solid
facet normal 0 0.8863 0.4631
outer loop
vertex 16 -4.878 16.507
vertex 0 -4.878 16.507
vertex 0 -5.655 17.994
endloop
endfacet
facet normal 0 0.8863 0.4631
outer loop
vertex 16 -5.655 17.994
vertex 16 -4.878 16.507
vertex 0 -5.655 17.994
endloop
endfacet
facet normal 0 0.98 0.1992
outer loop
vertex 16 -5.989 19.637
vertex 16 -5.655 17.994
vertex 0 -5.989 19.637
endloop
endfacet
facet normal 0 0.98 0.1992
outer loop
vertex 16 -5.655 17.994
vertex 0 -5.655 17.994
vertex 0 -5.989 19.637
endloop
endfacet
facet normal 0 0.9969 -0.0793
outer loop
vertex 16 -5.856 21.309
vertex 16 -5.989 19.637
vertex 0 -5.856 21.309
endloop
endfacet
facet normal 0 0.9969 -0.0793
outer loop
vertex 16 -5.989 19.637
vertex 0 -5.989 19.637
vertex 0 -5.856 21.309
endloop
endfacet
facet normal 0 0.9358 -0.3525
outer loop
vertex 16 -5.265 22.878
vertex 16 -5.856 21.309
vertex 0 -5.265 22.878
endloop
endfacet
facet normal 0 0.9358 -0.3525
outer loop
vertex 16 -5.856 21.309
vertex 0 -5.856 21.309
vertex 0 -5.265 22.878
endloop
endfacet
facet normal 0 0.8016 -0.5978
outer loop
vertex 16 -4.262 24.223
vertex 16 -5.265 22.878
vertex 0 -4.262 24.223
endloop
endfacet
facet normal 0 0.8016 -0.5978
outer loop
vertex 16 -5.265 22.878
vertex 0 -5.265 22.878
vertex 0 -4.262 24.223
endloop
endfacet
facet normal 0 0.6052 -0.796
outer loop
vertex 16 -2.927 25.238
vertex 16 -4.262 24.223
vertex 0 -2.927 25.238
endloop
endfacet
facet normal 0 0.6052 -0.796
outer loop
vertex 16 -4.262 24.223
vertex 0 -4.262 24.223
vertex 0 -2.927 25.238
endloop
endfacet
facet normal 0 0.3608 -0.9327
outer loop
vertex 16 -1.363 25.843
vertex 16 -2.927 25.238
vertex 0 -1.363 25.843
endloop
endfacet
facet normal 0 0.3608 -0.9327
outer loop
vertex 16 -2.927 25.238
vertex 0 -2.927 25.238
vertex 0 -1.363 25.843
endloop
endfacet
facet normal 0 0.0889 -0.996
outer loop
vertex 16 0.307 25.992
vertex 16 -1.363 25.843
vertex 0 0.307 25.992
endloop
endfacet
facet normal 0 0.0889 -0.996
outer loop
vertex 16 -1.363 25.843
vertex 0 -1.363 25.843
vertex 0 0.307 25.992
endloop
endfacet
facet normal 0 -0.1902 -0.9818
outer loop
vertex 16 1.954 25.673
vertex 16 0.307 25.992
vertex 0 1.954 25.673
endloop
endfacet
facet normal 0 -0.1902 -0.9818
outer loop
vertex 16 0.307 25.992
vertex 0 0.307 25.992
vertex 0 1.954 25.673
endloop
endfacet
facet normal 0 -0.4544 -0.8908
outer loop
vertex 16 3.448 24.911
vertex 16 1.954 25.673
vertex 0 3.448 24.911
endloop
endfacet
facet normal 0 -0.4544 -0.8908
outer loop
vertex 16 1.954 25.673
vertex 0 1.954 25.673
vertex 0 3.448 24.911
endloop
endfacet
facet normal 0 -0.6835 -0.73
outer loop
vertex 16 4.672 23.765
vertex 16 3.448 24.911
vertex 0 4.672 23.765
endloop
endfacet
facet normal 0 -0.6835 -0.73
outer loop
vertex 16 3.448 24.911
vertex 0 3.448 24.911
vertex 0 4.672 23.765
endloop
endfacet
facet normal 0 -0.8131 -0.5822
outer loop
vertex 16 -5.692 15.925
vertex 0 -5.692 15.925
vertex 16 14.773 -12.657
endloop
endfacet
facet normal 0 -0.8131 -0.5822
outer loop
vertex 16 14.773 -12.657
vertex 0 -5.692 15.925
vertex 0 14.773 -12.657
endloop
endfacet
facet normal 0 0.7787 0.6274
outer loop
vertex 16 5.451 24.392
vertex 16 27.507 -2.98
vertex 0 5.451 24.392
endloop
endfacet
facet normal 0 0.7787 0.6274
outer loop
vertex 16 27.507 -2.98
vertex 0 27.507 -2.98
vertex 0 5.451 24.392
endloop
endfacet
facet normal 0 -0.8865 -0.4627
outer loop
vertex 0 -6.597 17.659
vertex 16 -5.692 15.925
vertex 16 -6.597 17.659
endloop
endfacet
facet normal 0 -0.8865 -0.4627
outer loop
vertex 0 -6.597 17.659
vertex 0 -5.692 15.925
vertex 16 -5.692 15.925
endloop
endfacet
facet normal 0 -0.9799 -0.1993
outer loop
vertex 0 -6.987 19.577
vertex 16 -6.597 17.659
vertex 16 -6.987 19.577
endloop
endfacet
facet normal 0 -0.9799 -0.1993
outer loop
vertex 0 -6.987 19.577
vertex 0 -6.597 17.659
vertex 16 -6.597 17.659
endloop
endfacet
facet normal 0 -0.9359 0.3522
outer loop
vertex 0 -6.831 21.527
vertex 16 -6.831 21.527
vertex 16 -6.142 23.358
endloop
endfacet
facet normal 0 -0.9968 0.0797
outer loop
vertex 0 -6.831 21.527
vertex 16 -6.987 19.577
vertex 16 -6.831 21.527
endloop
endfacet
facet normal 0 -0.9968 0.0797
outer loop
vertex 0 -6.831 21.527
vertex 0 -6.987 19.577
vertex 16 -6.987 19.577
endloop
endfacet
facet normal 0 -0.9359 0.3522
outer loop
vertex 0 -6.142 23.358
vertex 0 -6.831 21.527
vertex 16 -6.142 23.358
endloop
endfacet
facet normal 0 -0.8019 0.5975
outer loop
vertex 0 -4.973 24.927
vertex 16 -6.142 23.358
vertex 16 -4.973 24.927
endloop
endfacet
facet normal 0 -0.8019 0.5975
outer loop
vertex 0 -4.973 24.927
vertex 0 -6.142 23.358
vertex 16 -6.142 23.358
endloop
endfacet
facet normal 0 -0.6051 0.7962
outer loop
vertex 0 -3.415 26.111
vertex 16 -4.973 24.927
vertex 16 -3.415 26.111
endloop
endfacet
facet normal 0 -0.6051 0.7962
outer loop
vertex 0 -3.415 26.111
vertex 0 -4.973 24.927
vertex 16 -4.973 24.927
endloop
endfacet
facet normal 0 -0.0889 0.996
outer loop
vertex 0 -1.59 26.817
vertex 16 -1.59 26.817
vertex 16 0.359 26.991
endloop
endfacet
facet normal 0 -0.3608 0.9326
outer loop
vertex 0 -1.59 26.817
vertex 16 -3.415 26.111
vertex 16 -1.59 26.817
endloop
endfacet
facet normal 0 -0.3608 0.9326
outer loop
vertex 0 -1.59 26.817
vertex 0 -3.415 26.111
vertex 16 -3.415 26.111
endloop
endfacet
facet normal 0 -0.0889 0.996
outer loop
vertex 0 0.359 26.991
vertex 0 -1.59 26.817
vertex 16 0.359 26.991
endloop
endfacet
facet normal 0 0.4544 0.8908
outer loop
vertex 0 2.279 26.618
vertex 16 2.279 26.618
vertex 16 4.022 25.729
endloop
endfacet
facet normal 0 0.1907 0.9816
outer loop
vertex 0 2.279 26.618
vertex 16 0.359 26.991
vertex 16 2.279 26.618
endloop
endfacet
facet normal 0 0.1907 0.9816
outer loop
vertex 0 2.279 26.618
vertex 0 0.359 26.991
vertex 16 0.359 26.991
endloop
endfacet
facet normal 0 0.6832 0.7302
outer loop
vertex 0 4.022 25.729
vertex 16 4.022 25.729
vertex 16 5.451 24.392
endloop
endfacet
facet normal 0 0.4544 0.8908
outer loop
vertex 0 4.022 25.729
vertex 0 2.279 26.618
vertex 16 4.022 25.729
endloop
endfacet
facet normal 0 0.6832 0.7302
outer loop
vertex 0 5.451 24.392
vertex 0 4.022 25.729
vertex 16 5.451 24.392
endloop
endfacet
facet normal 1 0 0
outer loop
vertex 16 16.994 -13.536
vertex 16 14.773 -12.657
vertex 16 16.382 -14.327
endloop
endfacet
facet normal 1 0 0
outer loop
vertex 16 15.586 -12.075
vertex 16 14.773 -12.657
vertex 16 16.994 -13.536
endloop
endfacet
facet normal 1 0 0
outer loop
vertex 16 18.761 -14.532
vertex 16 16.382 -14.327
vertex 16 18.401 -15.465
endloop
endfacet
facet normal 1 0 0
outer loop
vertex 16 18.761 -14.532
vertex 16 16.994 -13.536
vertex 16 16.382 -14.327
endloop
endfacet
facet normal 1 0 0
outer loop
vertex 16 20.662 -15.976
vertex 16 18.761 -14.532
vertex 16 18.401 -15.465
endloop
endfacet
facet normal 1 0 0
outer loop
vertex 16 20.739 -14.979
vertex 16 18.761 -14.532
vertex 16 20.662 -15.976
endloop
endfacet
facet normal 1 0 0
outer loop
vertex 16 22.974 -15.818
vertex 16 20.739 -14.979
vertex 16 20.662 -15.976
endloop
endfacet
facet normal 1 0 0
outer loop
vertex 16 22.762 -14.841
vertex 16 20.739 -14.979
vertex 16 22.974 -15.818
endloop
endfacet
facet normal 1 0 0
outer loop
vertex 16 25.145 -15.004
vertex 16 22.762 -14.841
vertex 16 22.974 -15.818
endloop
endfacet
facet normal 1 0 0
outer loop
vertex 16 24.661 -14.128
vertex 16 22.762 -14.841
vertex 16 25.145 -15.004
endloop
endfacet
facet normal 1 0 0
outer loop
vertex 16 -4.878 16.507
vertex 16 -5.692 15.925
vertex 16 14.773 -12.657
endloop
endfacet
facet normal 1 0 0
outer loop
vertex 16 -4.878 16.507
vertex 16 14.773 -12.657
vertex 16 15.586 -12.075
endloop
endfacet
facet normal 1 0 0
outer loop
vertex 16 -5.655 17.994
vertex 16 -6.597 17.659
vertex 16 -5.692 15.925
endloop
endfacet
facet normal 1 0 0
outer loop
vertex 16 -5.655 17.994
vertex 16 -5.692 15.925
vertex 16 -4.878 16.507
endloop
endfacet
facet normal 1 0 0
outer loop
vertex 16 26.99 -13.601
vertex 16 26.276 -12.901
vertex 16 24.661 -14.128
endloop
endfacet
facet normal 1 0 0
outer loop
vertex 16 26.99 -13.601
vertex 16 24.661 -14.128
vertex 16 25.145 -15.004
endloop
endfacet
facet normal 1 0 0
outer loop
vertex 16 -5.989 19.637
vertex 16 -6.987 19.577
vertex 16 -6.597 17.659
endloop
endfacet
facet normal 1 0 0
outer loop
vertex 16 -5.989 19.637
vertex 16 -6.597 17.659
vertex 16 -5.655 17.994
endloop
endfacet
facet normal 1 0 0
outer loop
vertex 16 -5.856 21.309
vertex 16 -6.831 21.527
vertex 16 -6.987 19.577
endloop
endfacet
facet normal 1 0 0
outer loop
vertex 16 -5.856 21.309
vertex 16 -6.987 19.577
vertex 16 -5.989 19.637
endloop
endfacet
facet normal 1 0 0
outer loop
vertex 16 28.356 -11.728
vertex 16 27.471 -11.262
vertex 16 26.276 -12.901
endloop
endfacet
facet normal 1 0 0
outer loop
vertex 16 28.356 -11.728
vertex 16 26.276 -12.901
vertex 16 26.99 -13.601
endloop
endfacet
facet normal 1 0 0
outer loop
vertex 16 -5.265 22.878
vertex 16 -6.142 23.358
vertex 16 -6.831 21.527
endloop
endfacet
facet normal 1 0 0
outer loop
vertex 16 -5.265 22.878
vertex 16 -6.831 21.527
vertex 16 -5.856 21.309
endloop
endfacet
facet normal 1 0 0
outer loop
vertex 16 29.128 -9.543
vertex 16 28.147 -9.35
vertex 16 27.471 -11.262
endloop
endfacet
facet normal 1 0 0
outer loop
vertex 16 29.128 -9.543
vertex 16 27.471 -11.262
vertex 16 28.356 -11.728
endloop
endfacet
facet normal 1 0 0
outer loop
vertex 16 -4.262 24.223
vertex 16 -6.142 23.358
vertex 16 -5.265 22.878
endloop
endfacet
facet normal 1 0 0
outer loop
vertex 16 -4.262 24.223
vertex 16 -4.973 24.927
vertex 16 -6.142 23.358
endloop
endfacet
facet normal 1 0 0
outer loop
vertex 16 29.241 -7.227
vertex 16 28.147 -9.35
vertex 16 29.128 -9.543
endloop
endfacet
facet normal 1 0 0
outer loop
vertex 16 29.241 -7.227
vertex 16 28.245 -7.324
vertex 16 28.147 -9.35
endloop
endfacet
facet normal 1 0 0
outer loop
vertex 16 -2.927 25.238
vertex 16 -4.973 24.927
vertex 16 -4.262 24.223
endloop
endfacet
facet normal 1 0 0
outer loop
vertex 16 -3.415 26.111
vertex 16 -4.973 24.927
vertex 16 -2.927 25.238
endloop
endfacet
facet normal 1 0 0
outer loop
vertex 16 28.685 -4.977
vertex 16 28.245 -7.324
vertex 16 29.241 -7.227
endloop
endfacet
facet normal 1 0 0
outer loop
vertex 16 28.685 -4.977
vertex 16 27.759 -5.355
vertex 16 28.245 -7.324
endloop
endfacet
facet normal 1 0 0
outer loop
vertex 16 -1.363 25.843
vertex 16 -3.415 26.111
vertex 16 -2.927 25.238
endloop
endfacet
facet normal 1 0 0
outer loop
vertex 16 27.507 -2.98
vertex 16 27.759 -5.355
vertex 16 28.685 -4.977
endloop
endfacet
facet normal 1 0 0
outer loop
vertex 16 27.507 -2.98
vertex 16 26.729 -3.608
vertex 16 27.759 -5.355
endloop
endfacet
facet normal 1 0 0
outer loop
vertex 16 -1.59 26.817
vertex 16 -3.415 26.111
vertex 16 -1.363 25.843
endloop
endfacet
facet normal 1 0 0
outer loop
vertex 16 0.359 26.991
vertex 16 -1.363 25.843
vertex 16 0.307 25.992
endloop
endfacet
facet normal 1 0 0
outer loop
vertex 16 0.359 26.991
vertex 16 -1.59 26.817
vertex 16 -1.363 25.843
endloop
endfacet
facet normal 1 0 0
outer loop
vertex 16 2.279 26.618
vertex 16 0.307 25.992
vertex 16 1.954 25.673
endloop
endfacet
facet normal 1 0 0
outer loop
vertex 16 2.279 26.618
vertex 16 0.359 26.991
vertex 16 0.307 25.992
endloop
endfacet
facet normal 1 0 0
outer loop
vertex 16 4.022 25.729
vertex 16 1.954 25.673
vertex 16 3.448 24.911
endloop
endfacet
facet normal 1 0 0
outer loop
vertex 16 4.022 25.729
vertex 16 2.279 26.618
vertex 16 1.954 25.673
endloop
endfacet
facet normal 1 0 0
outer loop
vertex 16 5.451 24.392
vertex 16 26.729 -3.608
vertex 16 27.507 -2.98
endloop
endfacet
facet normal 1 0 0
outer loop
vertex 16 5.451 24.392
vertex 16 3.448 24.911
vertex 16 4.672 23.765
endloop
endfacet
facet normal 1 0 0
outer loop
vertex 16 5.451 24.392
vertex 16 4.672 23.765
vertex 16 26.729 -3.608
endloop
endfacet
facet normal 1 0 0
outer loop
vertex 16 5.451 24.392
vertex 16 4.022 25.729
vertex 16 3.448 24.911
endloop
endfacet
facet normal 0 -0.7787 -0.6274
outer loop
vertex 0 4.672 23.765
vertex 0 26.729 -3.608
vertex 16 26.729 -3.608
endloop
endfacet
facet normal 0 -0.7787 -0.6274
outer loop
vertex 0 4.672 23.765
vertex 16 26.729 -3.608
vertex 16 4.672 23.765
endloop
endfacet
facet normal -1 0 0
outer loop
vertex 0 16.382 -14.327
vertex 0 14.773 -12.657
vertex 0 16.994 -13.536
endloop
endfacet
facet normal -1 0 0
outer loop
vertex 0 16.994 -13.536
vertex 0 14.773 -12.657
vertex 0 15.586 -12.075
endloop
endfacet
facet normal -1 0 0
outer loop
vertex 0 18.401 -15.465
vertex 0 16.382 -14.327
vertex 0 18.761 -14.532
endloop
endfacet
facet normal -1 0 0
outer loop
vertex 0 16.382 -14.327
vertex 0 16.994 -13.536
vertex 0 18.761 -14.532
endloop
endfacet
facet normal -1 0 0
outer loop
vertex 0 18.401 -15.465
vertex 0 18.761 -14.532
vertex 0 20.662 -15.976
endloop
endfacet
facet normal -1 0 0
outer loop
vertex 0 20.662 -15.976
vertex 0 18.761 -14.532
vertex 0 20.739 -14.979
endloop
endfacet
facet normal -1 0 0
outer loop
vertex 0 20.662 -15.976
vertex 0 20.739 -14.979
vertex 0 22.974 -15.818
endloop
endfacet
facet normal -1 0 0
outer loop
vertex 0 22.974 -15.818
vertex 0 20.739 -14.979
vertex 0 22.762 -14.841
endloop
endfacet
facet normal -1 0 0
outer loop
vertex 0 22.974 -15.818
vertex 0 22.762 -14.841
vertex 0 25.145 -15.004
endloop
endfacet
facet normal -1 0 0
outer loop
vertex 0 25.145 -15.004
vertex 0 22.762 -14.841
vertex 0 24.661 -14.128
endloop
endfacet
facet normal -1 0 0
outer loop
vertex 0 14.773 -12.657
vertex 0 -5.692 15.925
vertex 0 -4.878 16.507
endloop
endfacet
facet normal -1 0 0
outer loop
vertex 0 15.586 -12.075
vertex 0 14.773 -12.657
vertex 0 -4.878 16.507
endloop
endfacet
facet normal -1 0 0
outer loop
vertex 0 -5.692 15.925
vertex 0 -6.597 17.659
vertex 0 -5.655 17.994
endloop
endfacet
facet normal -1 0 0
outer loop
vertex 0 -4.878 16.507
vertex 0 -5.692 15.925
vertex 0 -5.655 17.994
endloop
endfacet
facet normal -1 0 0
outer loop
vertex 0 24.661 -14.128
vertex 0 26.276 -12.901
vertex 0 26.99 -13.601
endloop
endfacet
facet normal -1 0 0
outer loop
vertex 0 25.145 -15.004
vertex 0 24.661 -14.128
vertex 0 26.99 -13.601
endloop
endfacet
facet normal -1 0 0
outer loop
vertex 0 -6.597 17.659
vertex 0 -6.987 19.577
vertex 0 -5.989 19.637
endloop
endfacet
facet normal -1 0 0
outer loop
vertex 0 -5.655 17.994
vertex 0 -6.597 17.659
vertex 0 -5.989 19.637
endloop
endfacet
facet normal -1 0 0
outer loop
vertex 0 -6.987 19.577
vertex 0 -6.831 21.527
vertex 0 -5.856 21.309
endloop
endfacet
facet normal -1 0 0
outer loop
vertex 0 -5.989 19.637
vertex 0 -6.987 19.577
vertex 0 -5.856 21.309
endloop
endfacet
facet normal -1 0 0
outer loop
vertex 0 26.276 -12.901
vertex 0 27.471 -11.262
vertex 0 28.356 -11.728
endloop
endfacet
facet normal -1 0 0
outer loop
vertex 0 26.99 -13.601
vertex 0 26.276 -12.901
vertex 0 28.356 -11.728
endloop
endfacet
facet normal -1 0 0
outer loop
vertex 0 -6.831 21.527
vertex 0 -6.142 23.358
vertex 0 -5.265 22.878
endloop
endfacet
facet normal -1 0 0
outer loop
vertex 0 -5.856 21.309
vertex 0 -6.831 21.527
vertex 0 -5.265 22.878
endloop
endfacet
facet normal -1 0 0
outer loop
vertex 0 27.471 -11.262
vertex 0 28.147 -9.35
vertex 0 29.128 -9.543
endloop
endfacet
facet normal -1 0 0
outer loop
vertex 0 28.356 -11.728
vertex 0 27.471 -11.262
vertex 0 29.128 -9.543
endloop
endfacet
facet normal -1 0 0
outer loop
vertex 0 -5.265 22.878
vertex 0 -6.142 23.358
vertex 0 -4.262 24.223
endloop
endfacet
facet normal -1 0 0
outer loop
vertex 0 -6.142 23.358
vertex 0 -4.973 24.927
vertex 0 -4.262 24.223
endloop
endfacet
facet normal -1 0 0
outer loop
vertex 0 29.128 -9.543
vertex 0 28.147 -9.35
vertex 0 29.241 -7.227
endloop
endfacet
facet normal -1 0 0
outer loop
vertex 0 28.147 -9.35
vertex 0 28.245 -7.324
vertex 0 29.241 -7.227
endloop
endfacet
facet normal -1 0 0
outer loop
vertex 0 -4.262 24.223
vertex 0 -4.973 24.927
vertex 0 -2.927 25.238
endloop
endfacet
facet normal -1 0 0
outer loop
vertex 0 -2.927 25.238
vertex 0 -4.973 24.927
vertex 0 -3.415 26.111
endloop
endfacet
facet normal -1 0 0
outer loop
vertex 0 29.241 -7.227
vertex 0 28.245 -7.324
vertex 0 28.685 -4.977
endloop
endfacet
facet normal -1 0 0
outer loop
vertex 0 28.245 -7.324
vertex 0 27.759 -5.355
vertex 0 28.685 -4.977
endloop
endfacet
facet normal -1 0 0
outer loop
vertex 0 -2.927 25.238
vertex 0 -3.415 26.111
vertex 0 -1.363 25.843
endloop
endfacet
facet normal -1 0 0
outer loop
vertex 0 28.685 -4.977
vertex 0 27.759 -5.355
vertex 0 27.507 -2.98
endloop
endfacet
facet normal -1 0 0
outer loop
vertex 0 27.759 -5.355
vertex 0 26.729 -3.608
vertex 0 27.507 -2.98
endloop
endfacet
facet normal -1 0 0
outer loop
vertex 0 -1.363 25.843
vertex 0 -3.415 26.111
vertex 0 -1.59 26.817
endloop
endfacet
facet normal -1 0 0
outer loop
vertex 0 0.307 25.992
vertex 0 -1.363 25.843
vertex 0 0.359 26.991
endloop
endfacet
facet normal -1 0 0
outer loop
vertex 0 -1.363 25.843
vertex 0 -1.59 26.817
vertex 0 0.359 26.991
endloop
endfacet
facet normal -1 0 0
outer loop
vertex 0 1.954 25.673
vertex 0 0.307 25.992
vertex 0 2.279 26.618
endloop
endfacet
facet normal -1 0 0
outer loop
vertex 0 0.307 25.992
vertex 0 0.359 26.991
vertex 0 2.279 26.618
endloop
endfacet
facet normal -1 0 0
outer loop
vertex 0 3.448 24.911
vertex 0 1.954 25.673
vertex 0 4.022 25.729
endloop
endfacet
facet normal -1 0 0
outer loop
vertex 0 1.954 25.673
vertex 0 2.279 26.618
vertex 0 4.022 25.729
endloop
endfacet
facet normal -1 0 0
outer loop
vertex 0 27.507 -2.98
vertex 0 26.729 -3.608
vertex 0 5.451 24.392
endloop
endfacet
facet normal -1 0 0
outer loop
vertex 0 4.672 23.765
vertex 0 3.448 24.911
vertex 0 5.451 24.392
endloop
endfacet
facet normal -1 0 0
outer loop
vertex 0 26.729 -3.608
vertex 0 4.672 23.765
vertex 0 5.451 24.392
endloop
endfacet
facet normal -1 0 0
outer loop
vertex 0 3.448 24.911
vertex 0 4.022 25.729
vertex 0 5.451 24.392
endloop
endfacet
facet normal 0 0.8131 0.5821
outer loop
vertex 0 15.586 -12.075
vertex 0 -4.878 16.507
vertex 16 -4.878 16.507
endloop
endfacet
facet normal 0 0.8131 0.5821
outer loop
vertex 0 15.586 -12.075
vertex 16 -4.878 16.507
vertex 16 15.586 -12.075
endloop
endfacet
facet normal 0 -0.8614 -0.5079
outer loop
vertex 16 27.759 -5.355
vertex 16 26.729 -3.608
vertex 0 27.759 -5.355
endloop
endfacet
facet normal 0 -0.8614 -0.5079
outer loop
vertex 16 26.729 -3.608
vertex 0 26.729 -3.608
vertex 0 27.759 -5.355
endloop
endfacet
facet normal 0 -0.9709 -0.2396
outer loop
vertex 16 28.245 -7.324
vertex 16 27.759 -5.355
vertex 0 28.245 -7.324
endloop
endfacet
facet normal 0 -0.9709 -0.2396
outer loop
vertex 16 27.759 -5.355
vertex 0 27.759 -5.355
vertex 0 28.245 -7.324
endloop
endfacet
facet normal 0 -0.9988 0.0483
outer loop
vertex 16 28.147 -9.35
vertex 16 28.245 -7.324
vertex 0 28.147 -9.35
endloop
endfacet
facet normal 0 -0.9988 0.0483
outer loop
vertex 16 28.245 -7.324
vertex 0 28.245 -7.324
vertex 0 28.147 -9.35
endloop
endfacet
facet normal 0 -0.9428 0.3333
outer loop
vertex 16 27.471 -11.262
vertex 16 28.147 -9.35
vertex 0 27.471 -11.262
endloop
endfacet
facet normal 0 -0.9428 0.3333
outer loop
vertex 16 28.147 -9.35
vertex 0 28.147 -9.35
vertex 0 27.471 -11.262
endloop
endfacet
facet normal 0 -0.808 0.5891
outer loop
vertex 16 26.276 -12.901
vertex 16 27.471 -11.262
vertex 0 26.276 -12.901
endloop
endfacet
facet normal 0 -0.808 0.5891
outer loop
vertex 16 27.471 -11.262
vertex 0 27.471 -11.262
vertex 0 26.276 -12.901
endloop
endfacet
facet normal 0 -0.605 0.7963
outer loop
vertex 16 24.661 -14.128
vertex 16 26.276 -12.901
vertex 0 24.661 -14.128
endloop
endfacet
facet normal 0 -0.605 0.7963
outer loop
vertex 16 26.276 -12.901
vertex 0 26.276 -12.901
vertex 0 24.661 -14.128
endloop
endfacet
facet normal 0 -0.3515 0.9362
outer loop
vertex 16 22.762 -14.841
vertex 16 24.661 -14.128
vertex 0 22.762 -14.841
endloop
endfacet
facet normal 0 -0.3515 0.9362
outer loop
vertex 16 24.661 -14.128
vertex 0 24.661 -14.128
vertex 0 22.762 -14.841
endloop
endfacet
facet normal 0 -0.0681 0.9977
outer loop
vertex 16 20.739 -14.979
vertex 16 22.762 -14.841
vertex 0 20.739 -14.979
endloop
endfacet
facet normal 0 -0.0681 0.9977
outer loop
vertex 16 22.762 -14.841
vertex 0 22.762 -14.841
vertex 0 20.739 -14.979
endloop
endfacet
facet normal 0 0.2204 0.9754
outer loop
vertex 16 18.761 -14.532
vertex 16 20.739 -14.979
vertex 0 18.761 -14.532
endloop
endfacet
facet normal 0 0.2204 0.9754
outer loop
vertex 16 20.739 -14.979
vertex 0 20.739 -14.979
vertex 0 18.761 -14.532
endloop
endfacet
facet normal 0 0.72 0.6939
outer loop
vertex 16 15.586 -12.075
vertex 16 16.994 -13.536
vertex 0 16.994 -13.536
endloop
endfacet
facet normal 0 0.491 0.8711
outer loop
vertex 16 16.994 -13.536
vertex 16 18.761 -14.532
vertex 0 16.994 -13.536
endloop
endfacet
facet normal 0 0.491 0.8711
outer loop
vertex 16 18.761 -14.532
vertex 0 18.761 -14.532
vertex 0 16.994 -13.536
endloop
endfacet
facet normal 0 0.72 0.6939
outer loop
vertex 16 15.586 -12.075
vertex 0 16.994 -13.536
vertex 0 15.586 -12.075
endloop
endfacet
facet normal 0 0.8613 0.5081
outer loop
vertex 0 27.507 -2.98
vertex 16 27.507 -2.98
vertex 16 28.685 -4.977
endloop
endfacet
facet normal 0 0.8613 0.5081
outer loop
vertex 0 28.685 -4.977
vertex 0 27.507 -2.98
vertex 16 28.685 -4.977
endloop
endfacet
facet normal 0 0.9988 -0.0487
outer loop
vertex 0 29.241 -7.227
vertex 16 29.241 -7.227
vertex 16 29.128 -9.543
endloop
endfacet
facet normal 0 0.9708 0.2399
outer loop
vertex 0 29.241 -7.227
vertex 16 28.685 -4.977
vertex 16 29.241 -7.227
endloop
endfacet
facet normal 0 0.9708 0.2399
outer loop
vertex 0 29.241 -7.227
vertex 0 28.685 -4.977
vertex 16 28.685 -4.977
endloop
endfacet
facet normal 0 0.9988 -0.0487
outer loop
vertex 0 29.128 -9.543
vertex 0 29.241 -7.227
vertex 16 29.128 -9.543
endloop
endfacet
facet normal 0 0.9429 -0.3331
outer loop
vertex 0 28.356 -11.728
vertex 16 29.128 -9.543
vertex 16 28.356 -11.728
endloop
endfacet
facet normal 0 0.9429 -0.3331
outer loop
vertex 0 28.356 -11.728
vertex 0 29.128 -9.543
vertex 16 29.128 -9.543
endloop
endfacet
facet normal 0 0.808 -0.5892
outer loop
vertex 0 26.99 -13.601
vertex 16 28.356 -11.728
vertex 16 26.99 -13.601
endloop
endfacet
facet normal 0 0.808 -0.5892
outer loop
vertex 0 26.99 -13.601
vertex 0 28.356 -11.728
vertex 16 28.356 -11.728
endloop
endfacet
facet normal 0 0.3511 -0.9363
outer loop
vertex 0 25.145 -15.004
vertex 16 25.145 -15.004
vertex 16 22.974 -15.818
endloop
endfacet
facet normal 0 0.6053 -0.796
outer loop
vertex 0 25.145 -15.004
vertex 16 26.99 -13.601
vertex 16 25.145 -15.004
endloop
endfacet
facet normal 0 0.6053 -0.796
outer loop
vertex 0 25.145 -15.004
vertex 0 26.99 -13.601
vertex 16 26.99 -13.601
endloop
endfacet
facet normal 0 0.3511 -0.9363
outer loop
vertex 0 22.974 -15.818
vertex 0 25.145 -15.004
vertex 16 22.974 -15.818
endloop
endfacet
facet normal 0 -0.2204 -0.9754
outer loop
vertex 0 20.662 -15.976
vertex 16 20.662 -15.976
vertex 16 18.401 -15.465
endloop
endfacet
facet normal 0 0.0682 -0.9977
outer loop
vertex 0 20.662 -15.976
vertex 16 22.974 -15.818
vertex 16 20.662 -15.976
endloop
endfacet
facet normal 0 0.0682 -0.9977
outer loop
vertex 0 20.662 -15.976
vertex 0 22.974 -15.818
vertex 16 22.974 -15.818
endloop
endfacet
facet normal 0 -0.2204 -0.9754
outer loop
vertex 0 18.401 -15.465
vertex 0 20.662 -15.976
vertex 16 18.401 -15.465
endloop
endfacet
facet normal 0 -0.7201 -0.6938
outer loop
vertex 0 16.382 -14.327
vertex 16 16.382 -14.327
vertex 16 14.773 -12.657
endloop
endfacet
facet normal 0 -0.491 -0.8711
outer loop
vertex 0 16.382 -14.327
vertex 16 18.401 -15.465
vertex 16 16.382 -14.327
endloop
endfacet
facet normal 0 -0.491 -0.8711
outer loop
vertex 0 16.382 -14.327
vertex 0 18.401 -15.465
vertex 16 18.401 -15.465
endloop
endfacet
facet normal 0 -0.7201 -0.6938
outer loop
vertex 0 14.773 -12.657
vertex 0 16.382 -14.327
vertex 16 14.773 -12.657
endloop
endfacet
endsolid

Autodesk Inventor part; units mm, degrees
ref_plane "YZ Plane" through (0, 0, 0) normal (1, 0, 0) x (0, 1, 0)
ref_plane "XZ Plane" through (0, 0, 0) normal (0, 1, 0) x (-1, 0, 0)
ref_plane "XY Plane" through (0, 0, 0) normal (0, 0, 1) x (1, 0, 0)
sketch "Boceto1" plane through (0, 0, 0) normal (1, 0, 0) x (0, 1, 0)
  arc A0 (4.672, 23.7647) -> (-4.8784, 16.507) centre (0, 20) ccw
  arc A1 (15.5865, -12.0751) -> (26.7286, -3.6079) centre (21.278, -8) ccw
  line L0 (26.7286, -3.6079) -> (4.672, 23.7647)
  line L1 (-4.8784, 16.507) -> (15.5865, -12.0751)
  arc A2 (14.7734, -12.6573) -> (27.5073, -2.9805) centre (21.278, -8) ccw
  arc A3 (5.4506, 24.3921) -> (-5.6915, 15.9249) centre (0, 20) ccw
  line L2 (27.5073, -2.9805) -> (5.4506, 24.3921)
  line L3 (-5.6915, 15.9249) -> (14.7734, -12.6573)
  point P0 (0, 0)
  dimension "d2" = 6
  dimension "d3" = 7
  dimension "d4" = 8
  dimension "d5" = 20
  dimension "d6" = 3.259
  dimension "d7" = 16
  dimension "d8" = 14
extrude "Extrusión1" add sketch "Boceto1" along normal blind 16
properties part number "banda"
